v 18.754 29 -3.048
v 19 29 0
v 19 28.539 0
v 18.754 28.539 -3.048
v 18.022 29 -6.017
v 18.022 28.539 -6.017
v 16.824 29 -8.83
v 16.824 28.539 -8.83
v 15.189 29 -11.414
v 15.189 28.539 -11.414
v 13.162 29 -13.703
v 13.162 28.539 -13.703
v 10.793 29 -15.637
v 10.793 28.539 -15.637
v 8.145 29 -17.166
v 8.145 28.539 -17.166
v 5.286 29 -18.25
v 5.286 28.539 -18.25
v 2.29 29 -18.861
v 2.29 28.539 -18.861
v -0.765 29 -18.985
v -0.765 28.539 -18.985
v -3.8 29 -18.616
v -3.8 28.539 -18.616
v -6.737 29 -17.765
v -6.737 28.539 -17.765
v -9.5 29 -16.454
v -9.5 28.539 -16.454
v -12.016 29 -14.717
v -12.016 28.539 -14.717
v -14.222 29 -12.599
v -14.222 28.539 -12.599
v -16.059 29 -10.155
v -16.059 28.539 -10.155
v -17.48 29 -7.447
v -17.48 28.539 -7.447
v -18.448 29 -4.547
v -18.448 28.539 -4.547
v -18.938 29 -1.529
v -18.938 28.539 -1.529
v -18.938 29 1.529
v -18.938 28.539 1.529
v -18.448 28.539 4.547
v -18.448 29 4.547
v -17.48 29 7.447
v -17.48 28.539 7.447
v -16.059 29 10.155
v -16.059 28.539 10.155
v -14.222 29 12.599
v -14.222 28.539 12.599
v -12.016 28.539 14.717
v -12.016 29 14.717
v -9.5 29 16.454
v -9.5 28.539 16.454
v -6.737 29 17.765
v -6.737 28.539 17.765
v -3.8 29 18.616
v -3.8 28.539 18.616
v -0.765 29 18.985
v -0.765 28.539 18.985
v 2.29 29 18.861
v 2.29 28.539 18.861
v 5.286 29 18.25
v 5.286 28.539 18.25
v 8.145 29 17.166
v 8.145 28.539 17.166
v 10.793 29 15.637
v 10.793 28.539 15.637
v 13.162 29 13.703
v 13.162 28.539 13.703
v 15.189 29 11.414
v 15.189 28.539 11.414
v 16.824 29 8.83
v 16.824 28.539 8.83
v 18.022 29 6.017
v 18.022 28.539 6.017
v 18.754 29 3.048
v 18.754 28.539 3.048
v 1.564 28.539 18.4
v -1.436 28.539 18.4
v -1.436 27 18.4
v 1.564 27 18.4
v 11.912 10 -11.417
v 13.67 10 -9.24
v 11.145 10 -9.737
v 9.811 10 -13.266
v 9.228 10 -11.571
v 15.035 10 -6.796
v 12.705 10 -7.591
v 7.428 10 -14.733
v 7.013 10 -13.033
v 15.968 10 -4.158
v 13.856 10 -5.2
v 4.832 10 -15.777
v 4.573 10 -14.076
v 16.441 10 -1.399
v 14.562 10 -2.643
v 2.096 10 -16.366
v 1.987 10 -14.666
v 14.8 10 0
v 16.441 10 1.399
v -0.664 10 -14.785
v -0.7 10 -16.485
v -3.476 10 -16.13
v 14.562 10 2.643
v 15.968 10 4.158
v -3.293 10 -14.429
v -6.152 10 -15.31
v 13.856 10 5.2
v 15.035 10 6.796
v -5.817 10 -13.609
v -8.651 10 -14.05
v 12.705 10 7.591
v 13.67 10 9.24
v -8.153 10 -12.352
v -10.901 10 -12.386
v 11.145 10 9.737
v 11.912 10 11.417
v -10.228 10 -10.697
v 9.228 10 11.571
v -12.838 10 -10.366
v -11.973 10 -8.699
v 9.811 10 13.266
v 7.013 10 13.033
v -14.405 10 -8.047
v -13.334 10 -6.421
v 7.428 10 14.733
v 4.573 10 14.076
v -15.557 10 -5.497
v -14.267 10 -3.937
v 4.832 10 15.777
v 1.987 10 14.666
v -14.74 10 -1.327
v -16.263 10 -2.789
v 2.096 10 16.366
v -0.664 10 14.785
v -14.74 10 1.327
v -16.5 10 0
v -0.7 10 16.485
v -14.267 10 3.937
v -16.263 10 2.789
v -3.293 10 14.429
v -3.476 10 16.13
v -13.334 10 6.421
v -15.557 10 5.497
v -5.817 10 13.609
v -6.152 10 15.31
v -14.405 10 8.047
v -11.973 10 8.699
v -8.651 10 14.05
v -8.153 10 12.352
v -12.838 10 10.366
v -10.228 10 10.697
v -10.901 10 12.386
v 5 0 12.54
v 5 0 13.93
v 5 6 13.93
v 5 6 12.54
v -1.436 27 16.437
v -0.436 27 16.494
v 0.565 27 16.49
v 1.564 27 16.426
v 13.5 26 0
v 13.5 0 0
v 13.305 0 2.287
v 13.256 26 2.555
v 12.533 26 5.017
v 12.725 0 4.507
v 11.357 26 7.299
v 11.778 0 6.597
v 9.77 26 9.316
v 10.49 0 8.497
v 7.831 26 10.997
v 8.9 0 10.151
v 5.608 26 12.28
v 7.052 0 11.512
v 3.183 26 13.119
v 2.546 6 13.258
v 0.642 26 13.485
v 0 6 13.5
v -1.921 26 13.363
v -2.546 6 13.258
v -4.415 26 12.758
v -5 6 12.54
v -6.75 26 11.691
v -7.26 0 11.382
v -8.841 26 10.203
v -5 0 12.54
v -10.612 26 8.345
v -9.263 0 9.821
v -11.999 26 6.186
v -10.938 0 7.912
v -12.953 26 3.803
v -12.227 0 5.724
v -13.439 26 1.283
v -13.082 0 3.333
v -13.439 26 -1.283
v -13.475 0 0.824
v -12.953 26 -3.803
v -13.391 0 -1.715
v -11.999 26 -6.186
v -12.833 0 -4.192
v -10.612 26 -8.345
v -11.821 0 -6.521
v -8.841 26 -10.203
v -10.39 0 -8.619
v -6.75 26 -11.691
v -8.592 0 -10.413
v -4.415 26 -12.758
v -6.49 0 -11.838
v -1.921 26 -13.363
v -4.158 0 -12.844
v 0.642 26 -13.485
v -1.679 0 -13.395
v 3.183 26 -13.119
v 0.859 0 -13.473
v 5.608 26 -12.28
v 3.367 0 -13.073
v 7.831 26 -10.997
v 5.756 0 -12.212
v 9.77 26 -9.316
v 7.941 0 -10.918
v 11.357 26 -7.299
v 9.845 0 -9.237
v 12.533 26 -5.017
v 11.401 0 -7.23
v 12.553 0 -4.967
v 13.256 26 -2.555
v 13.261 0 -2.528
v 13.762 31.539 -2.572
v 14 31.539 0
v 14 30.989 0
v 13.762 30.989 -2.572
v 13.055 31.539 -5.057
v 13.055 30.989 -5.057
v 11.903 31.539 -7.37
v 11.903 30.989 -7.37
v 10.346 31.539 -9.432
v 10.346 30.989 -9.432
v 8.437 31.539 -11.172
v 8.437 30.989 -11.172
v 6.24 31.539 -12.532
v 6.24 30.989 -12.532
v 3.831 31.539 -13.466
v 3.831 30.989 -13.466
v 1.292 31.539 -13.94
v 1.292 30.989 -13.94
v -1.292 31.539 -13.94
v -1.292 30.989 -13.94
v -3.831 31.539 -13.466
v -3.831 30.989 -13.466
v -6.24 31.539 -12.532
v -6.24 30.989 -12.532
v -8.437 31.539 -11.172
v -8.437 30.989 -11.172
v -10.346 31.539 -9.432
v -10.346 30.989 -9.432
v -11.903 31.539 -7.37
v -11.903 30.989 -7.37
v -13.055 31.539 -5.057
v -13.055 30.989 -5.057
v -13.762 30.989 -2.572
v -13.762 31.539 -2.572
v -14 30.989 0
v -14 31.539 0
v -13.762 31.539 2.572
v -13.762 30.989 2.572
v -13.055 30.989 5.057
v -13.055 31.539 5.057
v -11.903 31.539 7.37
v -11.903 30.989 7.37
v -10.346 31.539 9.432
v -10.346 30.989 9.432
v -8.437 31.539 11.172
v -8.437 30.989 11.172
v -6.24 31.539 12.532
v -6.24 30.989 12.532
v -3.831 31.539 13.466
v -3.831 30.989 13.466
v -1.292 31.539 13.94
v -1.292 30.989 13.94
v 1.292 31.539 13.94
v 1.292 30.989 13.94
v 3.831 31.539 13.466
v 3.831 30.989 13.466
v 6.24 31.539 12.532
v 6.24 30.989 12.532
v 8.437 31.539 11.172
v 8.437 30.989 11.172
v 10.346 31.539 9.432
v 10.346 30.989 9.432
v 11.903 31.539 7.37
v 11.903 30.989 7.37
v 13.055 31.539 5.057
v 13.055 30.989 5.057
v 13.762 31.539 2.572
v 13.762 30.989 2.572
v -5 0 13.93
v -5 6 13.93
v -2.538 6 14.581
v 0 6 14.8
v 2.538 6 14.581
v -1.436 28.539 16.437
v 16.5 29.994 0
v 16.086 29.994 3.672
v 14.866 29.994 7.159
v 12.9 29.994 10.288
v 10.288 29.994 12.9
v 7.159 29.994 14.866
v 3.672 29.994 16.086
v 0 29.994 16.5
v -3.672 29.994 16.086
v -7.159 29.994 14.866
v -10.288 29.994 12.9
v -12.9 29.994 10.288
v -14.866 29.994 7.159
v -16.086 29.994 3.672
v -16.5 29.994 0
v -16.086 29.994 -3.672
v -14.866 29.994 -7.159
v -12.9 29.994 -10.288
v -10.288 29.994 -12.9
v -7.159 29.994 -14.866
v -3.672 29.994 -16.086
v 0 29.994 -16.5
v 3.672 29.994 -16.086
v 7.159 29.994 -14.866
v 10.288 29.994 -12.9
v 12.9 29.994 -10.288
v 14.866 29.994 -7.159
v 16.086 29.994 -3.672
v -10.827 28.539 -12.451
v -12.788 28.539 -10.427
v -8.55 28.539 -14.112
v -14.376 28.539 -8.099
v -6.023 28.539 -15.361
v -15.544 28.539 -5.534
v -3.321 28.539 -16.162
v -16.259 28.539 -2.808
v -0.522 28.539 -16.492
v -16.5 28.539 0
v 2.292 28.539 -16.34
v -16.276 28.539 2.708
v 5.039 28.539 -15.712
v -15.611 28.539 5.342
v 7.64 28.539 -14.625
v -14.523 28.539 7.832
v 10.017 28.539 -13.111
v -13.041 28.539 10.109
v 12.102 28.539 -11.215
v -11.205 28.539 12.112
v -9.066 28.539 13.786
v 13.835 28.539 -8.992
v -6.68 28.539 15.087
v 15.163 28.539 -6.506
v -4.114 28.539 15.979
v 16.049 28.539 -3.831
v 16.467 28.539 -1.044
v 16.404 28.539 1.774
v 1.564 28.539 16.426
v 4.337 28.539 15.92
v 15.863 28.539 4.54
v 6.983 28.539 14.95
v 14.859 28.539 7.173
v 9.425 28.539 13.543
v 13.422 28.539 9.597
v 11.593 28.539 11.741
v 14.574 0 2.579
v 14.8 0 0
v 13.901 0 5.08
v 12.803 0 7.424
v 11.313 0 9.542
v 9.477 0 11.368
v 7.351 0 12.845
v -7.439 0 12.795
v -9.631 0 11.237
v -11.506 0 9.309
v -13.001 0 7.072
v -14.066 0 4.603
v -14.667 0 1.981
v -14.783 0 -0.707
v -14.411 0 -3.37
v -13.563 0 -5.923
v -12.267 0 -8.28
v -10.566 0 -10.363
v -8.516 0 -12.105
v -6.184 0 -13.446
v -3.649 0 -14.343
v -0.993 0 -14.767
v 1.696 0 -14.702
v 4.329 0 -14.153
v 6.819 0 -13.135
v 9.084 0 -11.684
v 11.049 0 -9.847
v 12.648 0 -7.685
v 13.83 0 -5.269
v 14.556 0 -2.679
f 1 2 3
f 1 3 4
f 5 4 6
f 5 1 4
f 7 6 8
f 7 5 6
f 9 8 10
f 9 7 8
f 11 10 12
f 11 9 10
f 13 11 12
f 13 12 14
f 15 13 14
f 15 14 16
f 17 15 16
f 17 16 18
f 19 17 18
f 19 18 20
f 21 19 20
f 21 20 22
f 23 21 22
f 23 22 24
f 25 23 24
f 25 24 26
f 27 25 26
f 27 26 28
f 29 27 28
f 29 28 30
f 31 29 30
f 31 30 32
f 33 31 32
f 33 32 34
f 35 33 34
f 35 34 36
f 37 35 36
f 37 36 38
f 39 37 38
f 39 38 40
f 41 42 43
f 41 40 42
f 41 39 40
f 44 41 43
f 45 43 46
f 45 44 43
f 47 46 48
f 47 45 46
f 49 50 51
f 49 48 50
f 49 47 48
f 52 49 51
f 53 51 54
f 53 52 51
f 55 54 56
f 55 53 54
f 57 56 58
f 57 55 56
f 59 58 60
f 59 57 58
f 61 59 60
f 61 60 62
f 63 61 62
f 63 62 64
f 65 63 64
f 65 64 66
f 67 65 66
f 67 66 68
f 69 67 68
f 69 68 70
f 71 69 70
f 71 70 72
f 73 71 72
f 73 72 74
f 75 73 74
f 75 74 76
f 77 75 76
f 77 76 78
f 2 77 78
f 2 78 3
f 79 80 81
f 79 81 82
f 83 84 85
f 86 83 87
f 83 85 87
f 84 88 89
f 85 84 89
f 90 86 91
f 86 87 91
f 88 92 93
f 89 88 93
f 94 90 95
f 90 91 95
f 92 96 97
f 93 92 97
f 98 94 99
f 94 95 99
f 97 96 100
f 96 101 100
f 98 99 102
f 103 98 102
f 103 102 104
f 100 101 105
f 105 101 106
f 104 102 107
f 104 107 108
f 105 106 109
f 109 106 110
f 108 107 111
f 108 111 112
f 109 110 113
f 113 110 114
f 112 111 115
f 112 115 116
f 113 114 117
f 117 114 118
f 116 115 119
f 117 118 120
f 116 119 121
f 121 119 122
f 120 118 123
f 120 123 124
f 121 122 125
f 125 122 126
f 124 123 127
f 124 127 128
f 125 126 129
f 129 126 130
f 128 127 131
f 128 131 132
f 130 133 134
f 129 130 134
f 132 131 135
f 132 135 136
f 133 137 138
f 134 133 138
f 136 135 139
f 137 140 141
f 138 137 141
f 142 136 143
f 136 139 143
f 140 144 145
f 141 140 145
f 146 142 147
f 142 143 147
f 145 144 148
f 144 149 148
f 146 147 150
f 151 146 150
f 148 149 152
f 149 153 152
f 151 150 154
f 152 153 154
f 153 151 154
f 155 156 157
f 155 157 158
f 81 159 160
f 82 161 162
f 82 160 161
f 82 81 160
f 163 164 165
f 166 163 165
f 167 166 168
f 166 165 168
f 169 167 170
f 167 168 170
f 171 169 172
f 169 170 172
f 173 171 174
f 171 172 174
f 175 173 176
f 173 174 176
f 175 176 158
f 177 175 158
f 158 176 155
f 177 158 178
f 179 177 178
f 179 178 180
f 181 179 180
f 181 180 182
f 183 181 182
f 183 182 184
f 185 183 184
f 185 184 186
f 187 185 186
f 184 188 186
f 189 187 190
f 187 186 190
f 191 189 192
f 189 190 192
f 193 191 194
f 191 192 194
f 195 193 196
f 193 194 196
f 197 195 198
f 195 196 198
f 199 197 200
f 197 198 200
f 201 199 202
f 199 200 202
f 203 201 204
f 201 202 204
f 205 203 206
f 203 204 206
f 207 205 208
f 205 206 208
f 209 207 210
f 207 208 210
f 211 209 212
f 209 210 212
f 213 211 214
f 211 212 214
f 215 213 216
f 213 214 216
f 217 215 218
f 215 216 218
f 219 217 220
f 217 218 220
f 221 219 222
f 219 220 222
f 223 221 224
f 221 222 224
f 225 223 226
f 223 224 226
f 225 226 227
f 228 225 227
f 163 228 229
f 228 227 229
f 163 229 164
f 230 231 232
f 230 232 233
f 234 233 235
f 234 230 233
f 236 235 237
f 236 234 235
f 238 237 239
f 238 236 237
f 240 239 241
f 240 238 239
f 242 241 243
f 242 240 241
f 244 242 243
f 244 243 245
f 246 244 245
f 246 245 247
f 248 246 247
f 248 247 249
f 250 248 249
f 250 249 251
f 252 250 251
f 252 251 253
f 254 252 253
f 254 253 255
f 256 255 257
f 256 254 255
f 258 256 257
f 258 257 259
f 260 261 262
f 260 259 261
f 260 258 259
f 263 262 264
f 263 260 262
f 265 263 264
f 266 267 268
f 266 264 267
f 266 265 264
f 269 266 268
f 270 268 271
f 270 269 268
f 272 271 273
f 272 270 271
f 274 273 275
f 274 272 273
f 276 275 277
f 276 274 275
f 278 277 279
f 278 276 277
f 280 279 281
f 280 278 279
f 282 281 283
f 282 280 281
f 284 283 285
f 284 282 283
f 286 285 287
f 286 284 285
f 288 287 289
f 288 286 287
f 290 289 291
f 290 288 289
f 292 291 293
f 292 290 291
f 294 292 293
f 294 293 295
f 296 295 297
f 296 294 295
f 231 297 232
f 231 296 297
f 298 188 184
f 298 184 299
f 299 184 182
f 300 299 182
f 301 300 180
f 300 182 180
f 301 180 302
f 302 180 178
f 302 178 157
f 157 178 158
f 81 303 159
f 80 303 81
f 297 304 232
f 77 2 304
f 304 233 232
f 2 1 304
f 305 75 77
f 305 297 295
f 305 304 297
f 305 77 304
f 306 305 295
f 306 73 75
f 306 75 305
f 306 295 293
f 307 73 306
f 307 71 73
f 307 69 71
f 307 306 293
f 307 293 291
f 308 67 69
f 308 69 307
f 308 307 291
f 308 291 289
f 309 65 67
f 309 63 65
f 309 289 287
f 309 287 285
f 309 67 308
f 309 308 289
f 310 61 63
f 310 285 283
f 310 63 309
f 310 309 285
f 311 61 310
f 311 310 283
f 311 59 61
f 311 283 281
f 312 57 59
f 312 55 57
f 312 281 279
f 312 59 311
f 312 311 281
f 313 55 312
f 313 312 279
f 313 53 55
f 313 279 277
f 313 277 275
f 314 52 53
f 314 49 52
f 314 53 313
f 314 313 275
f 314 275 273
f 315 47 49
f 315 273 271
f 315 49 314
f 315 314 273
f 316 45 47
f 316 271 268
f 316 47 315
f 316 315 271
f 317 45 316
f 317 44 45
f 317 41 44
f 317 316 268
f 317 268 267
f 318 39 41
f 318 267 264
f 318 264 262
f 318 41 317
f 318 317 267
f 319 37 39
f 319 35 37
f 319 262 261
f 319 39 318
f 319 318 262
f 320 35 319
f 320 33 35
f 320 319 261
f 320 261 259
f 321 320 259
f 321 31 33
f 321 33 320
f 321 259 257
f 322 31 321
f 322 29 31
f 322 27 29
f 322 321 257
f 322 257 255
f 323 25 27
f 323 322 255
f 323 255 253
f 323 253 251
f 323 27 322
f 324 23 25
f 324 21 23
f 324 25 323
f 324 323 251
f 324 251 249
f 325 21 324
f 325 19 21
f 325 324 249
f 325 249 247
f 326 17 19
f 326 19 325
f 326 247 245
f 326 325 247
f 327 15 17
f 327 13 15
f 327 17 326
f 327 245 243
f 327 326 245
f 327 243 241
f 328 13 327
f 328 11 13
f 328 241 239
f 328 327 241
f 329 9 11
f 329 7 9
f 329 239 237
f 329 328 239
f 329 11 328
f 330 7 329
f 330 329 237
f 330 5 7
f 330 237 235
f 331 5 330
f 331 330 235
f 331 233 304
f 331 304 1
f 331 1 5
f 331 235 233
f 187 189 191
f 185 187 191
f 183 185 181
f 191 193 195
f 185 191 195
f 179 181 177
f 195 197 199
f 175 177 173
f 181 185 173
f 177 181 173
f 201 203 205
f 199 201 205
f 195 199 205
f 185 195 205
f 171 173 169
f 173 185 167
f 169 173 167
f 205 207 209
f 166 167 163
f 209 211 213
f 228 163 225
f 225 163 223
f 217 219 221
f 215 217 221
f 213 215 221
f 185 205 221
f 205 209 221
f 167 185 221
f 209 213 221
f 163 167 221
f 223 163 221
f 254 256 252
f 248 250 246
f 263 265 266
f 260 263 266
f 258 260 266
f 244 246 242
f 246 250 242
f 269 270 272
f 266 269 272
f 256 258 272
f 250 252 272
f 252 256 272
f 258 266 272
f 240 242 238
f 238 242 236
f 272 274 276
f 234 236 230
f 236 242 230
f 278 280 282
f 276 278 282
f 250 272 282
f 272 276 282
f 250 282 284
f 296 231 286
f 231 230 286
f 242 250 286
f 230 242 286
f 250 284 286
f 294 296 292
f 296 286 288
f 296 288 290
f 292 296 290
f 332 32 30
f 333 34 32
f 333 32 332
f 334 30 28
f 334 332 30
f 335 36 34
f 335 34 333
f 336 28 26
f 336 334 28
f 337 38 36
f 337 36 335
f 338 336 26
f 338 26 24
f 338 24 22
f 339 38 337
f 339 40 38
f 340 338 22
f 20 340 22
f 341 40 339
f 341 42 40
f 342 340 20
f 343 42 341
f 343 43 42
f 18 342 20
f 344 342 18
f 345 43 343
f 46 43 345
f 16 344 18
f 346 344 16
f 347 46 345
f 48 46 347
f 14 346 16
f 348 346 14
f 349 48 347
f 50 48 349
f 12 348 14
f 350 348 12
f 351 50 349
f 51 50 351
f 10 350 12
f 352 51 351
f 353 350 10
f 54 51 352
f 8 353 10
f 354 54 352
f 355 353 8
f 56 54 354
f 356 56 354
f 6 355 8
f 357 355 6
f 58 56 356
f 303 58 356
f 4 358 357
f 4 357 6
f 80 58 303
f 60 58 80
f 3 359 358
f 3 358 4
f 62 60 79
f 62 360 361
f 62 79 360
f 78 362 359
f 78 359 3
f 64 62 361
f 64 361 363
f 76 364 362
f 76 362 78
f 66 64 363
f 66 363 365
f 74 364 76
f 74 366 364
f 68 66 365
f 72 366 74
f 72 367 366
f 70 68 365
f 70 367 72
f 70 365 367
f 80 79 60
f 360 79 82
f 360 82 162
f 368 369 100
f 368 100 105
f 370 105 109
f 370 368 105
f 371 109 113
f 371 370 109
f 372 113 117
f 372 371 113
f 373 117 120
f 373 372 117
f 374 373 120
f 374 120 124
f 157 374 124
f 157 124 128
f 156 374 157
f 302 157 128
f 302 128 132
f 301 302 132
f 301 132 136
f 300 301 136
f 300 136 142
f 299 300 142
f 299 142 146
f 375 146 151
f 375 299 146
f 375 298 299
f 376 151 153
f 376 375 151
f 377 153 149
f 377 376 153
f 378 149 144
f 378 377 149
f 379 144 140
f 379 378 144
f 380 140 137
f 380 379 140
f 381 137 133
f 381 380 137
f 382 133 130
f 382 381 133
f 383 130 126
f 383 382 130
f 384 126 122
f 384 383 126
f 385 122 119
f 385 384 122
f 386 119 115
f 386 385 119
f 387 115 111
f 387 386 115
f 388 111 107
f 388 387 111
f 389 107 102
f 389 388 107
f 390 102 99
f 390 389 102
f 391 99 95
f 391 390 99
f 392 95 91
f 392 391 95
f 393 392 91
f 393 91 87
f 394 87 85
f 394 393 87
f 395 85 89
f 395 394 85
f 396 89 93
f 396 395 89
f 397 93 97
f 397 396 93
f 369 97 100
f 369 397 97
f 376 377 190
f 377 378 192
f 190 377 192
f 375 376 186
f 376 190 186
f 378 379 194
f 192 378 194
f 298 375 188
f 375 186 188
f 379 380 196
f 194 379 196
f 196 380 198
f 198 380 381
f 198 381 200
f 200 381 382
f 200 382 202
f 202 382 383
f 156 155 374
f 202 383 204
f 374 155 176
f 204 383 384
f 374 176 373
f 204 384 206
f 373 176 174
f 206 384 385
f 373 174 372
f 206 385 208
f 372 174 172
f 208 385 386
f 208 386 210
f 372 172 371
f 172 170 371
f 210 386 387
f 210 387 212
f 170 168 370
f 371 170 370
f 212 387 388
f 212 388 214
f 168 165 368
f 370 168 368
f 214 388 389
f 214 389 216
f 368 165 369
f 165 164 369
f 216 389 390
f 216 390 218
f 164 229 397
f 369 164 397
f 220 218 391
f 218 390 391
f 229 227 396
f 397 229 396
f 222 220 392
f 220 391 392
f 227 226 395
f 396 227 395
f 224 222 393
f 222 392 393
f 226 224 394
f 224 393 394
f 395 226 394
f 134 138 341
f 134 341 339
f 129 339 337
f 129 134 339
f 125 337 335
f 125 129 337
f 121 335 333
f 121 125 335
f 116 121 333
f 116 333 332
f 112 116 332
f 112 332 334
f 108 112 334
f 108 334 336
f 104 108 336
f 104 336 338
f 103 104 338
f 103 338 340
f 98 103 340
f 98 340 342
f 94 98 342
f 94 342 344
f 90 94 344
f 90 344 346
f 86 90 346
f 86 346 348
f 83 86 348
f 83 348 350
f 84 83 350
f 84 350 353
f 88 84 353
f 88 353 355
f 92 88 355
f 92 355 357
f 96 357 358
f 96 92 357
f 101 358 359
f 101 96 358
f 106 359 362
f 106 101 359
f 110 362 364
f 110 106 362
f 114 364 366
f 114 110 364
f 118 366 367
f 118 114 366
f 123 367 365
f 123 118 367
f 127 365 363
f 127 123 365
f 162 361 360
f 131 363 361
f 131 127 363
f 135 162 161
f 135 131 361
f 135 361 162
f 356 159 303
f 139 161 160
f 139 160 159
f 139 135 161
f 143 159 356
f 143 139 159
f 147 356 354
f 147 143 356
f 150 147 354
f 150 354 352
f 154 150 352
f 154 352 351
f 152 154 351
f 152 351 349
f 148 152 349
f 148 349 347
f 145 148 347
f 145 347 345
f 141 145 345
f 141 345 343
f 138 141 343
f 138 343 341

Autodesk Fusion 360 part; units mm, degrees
sketch "スケッチ1" plane through (0, 0, 0) normal (0, 1, 0) x (1, 0, 0)
  circle A0 centre (0, 0) radius 14.8
  curve L0
  dimension "d1" = 29.6
extrude "押し出し1" add sketch "スケッチ1" along normal blind 10 makes body 1
sketch "スケッチ2" plane through (0, 10, 0) normal (0, 1, 0) x (-1, 0, 0)
  circle A0 centre (0, 0) radius 14.8
  circle A1 centre (0, 0) radius 16.5
  line L0 (1.8, 16.1642) -> (-1.8, 16.1642)
  line L1 (-2, 15.9642) -> (-2, 14.6642)
  line L2 (-2, 14.6642) -> (2, 14.6642)
  line L3 (2, 14.6642) -> (2, 15.9642)
  circle A2 centre (0, 0) radius 14.8
  arc A3 (-1.8, 16.1642) -> (-2, 15.9642) centre (-1.8, 15.9642) ccw
  arc A4 (2, 15.9642) -> (1.8, 16.1642) centre (1.8, 15.9642) ccw
  curve L4
  point P0 (2, 16.1642)
  point P1 (-2, 16.1642)
  dimension "d4" = 33
  dimension "d38" = 4
  dimension "d39" = 1.5
  dimension "d40" = 0.2
  dimension "d41" = 0.2
extrude "押し出し2" add sketch "スケッチ2" along normal blind 19 contours A0 L2 A2 | A0 L2 A2 | A0 L0 L1 L3 A2 A3 A4 | A1 bodies 1
ref_plane "作業平面1" through (0, 24, 0) normal (0, 1, 0) x (-1, 0, 0)
sketch "スケッチ3" plane through (0, 24, 0) normal (0, 1, 0) x (1, 0, 0)
ref_plane "作業平面2" through (0, 29, 0) normal (0, -1, 0) x (-1, 0, 0)
sketch "スケッチ8" plane through (0, 0, 0) normal (0, 0, 1) x (1, 0, 0)
  line L0 (0, 28.5387) -> (19, 28.5387)
  line L1 (19, 28.5387) -> (19, 29)
  line L2 (19, 29) -> (14, 30.9887)
  line L3 (14, 30.9887) -> (0, 30.9887)
  line L4 (0, 30.9887) -> (0, 28.5387)
  curve L5
  line L6 (0, 1.75) -> (0, 22.5)
  dimension "d26" = 2.45
  dimension "d30" = 14
revolve "回転1" add sketch "スケッチ8" angle 360 about axis through (0, 30.9887, 0) along (0, -1, 0) bodies 1
ref_plane "作業平面9" through (0, 31.5387, 0) normal (0, -1, 0) x (0, 0, -1)
sketch "スケッチ11" plane through (0, 31.5387, 0) normal (0, -1, 0) x (1, 0, 0)
  circle A0 centre (0, 0) radius 14
  dimension "d29" = 28
extrude "押し出し6" add sketch "スケッチ11" along normal blind 1 bodies 1
sketch "スケッチ16" plane through (0, 29, 0) normal (0, -1, 0) x (1, 0, 0)
  line L0 (-1.4356, 18.4) -> (1.5644, 18.4)
  line L1 (1.5644, 18.4) -> (1.5644, 15.4)
  line L2 (1.5644, 15.4) -> (-1.4356, 15.4)
  line L3 (-1.4356, 15.4) -> (-1.4356, 18.4)
  curve L4
  dimension "d48" = 3
  dimension "d49" = 18.4
  dimension "d50" = 3
extrude "押し出し8" add sketch "スケッチ16" along normal blind 2 bodies 1
sketch "スケッチ19" plane through (0, 0, 0) normal (0, 1, 0) x (1, 0, 0)
  circle A0 centre (0, 0) radius 13.5
  dimension "d53" = 27
extrude "押し出し9" cut sketch "スケッチ19" along normal blind 26 bodies 1
sketch "スケッチ20" plane through (0, 0, 0) normal (0, 1, 0) x (1, 0, 0)
  line L0 (-5, -15) -> (5, -15)
  line L1 (5, -15) -> (5, -12)
  line L2 (5, -12) -> (-5, -12)
  line L3 (-5, -12) -> (-5, -15)
  line L4 (0, -1.75) -> (0, -22.5)
  dimension "d56" = 10
  dimension "d58" = 3
  dimension "d59" = 15
extrude "押し出し10" cut sketch "スケッチ20" along normal blind 6 bodies 1
copy_body "ボディ -> コンポーネント1" bodies 1 removing the originals makes body 2 in component "btn"
thread "ねじ1" in component "btn"
component "btn" placed x (1, 0, 0) y (0, 1, 0) z (0, 0, 1) at (0, 0, 0)
